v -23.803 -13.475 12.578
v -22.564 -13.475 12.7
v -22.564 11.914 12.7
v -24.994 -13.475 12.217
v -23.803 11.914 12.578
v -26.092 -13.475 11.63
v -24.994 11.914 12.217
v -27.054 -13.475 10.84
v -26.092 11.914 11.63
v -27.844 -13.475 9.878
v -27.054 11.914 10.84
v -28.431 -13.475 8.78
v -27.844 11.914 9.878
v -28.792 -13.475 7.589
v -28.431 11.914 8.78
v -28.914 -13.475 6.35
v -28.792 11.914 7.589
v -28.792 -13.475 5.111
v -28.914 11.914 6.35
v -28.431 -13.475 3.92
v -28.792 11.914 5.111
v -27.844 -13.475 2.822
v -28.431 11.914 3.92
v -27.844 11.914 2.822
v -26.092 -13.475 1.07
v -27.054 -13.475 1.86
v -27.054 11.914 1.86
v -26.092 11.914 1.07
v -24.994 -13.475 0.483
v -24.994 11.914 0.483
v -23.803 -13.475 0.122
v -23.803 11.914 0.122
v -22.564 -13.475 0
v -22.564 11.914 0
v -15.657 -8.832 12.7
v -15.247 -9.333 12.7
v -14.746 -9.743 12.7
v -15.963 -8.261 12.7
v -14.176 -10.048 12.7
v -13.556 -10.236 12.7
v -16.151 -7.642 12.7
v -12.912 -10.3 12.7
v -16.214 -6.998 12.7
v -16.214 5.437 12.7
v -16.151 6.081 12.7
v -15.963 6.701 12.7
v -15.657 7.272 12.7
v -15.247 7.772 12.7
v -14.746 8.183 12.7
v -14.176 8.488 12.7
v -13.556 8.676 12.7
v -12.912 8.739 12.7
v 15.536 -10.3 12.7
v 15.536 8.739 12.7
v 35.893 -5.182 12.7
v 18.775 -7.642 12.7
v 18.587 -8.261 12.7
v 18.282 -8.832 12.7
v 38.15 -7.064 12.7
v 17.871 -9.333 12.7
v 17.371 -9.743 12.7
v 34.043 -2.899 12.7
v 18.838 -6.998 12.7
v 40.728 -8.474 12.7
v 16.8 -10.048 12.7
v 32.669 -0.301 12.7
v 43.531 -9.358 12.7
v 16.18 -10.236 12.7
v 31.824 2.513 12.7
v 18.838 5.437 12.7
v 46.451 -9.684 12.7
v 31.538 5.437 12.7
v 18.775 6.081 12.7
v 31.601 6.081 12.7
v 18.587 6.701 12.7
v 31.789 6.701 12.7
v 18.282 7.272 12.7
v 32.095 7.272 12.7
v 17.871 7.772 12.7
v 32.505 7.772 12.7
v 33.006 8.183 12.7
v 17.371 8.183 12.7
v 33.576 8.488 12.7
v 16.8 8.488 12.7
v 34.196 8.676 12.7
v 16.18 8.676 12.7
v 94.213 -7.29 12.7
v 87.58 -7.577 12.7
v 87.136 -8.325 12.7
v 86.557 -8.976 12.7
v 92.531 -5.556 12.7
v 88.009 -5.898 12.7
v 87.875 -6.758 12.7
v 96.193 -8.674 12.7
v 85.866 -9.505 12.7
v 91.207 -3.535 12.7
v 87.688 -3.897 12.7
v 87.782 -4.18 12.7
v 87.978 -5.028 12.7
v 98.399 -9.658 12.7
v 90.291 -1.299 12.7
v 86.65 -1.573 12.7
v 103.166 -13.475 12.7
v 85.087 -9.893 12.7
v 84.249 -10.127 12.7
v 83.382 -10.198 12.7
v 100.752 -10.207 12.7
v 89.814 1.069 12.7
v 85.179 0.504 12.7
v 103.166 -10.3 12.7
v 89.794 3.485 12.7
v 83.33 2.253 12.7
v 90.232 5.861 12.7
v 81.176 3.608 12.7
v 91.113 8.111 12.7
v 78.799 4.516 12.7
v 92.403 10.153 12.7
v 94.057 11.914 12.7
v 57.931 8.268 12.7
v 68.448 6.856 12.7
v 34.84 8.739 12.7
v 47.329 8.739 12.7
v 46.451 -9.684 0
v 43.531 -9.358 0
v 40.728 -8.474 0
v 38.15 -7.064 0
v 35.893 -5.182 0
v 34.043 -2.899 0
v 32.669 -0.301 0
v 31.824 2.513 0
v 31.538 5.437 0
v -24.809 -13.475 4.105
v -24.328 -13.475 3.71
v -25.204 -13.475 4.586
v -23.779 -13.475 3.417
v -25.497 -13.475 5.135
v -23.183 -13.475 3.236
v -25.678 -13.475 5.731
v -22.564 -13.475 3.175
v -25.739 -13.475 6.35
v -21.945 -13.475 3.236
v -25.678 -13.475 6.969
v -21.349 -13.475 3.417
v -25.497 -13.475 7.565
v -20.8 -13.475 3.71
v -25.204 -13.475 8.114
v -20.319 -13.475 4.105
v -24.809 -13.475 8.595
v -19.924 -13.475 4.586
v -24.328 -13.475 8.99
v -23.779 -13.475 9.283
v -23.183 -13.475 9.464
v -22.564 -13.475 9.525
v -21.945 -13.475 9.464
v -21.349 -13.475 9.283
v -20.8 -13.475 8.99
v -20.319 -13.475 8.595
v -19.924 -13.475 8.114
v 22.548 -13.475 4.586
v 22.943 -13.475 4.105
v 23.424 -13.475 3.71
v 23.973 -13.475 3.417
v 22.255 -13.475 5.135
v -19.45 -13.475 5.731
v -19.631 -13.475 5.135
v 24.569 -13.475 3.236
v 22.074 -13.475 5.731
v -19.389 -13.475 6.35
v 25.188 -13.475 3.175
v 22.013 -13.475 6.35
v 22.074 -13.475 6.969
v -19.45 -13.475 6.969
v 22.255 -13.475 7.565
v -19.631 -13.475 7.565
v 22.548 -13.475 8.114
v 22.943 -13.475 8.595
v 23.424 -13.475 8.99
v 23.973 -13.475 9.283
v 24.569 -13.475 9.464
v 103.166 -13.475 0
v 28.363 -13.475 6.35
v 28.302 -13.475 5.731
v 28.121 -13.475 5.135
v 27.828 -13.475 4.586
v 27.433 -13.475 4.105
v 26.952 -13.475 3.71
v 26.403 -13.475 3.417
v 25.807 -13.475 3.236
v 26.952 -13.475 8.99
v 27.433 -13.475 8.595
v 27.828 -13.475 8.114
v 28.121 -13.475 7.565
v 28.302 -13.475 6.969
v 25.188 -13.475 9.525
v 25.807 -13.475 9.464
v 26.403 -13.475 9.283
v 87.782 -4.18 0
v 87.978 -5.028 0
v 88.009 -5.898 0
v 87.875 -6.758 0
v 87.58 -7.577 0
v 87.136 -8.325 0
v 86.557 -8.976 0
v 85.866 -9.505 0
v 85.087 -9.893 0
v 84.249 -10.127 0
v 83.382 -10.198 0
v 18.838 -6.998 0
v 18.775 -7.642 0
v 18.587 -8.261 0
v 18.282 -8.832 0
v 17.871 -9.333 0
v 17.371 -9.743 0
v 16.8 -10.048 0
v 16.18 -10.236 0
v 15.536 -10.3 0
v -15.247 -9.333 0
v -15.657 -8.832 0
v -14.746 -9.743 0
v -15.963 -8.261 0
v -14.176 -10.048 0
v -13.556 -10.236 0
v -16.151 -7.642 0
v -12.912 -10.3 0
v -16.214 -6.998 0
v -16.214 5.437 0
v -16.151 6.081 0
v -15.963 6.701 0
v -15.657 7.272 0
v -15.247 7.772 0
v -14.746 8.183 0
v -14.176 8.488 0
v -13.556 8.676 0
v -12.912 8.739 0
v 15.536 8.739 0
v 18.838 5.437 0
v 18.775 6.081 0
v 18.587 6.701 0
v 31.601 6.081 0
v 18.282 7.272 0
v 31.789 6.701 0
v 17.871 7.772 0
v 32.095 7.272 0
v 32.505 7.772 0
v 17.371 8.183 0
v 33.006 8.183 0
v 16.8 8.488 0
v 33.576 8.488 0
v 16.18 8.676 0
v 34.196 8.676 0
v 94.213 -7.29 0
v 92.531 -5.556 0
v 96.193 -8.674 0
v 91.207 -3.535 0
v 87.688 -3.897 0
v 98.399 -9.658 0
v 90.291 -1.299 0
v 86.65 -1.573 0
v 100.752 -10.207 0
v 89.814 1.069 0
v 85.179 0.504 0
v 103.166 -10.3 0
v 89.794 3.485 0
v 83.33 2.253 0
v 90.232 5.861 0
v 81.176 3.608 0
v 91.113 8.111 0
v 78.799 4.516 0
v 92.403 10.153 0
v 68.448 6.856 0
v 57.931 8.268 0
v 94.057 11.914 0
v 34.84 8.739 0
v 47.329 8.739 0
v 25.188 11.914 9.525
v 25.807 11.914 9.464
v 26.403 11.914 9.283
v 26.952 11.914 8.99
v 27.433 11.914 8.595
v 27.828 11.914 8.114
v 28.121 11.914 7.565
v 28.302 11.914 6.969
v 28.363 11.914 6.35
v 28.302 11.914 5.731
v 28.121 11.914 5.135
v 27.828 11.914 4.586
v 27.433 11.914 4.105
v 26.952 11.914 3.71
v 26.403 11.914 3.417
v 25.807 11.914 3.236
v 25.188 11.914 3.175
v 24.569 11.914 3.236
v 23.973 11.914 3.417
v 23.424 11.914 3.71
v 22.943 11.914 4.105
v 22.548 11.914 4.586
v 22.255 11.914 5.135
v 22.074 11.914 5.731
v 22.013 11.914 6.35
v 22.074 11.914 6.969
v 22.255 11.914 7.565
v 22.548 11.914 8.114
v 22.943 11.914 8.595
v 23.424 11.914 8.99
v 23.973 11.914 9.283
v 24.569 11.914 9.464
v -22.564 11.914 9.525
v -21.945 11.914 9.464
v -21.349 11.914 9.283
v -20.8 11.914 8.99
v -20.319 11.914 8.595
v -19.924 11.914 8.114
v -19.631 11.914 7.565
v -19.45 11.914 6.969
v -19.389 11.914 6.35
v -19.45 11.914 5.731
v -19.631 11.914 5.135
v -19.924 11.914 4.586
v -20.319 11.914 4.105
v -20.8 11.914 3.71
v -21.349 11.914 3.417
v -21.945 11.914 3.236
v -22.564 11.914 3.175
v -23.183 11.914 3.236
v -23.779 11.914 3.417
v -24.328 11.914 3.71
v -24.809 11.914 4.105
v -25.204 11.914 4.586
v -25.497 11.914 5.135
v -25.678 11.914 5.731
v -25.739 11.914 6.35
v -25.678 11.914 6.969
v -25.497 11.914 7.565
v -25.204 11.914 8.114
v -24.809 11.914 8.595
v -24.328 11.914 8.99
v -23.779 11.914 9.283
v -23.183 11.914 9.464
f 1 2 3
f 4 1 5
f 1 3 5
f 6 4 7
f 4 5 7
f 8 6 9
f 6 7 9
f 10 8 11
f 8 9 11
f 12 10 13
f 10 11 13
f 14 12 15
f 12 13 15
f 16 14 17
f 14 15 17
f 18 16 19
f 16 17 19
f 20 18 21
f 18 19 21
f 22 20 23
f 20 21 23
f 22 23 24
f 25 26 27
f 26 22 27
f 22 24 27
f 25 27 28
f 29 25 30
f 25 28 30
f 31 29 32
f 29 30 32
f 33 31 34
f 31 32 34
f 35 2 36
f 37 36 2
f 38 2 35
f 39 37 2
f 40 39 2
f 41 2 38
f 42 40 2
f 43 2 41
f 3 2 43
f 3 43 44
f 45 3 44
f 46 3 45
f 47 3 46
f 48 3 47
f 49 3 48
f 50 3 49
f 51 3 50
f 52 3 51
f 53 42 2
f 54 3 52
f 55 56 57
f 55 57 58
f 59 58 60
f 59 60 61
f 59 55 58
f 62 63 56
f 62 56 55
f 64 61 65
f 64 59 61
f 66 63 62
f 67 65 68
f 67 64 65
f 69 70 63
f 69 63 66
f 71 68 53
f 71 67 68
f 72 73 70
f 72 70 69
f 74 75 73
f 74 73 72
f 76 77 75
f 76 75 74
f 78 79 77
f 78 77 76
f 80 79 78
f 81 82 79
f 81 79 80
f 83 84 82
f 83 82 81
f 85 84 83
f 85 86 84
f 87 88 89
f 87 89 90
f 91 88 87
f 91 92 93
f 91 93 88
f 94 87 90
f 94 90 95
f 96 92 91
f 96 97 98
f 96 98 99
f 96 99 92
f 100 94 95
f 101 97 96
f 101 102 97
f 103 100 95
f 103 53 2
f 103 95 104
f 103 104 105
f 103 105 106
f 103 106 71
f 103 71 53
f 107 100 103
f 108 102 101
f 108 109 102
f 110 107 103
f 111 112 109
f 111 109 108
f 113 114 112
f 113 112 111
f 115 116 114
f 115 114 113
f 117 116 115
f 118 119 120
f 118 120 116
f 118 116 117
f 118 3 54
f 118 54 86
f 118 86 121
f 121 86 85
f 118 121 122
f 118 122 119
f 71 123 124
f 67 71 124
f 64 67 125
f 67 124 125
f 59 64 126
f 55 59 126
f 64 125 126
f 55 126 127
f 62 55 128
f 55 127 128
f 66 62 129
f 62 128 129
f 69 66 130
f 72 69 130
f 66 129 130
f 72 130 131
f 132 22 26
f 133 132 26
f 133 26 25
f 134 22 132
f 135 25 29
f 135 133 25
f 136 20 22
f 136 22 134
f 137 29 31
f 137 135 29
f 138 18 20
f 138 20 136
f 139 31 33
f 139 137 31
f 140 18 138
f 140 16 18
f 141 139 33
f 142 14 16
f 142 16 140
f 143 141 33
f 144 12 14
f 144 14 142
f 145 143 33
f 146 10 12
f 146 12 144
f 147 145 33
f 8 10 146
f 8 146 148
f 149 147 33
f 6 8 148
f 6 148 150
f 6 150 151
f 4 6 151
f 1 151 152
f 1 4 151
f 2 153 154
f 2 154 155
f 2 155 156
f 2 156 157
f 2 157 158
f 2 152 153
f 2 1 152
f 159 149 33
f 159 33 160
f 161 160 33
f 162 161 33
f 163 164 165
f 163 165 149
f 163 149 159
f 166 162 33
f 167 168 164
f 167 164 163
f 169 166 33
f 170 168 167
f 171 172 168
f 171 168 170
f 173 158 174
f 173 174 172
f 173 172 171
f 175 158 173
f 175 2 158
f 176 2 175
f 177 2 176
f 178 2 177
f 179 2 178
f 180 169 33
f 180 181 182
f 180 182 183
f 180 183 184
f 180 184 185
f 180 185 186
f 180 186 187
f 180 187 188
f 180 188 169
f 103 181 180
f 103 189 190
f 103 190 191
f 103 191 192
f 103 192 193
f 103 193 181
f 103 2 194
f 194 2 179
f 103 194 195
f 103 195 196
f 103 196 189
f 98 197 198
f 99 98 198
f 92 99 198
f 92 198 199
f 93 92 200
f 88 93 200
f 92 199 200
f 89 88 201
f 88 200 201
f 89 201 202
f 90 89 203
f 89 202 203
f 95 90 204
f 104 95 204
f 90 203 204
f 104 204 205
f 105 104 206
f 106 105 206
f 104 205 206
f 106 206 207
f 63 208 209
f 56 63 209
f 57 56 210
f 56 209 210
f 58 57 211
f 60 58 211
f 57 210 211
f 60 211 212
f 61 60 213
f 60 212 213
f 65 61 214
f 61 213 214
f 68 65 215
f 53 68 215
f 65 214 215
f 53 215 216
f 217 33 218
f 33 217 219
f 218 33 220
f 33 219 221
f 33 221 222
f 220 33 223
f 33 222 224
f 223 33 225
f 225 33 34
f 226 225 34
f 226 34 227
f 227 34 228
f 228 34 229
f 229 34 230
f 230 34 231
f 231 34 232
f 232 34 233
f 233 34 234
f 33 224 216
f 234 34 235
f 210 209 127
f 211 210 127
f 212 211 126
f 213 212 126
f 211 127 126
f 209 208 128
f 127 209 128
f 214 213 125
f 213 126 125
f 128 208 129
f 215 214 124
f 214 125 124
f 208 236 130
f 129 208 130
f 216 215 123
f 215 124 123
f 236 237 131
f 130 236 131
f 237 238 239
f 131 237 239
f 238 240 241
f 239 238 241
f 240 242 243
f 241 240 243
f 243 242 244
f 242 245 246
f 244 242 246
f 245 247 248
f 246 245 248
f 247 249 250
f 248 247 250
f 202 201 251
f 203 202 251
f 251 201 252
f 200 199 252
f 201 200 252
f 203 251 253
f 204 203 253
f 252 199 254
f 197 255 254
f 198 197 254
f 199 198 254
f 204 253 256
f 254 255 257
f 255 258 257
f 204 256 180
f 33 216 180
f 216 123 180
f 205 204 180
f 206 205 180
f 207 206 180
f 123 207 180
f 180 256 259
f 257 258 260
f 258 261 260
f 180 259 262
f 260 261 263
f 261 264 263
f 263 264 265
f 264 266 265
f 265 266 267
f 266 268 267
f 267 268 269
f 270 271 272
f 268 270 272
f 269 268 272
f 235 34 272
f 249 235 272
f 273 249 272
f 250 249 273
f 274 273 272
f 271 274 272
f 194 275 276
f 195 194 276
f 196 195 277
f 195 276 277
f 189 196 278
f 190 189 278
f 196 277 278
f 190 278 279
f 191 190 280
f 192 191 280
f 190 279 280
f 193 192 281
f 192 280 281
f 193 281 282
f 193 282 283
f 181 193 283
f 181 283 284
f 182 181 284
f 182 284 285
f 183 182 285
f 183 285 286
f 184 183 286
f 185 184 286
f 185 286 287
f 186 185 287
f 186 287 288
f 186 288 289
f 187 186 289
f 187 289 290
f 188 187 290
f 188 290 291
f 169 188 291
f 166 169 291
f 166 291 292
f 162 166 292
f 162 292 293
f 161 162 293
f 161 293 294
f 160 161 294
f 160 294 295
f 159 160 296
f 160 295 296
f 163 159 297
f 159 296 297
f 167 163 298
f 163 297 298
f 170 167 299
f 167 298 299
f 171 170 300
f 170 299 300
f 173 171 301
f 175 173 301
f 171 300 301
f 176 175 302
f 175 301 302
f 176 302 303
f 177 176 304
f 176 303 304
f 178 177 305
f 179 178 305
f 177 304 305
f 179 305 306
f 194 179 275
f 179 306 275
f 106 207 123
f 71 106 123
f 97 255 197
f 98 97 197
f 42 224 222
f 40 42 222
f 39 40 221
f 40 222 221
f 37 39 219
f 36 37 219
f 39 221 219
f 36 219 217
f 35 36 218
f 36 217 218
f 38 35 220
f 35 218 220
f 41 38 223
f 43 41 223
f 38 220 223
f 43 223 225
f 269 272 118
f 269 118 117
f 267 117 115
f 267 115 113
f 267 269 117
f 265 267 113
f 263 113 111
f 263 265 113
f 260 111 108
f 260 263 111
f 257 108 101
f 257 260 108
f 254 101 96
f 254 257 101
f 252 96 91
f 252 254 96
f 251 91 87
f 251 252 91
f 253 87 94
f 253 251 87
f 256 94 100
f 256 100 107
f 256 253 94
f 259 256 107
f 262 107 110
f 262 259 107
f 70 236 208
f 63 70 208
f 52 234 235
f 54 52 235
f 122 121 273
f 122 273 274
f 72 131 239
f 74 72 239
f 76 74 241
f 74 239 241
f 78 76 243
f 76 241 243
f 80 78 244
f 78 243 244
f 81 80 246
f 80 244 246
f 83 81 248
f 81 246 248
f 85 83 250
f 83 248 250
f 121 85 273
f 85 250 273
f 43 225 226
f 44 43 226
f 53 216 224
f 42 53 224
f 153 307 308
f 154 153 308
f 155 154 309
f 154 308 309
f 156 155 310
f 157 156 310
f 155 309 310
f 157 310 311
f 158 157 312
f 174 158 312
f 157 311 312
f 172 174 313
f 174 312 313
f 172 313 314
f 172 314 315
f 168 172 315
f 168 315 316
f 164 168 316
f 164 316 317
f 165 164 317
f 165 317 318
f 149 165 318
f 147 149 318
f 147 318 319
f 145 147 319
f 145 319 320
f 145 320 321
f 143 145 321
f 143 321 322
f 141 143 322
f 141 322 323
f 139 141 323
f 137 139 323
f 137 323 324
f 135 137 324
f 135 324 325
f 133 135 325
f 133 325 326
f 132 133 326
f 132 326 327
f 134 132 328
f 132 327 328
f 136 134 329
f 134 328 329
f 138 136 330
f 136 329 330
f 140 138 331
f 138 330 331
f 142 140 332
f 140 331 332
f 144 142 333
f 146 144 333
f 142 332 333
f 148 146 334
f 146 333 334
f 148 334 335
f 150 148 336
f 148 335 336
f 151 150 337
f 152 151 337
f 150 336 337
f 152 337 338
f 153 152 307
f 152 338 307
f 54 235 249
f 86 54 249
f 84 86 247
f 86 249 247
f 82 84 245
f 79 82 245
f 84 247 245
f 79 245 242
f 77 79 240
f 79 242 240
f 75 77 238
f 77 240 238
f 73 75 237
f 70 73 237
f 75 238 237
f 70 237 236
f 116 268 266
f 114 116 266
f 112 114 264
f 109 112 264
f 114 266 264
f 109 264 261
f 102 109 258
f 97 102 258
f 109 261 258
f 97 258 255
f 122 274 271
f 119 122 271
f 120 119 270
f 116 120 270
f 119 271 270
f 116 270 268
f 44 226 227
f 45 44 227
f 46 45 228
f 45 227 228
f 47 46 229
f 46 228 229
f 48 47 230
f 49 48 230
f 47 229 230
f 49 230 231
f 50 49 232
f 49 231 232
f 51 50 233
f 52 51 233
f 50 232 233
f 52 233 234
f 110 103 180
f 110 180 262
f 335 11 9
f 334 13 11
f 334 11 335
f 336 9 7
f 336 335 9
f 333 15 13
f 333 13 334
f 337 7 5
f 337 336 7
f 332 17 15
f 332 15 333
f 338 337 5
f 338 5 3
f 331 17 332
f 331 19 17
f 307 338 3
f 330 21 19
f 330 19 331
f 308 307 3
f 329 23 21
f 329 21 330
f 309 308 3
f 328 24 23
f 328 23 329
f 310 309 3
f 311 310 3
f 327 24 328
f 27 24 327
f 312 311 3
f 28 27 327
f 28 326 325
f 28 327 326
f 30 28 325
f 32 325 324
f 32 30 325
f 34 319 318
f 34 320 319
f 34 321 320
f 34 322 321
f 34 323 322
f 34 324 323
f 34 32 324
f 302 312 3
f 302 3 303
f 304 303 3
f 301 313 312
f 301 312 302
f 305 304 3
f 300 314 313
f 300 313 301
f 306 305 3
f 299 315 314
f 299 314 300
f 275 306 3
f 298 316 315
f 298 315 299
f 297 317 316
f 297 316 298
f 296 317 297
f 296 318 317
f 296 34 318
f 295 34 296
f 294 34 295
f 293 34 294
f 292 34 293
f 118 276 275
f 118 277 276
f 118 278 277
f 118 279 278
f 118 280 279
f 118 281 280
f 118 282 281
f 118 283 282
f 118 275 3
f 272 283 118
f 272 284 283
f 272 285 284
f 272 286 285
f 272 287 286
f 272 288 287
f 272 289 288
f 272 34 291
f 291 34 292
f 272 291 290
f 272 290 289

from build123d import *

# Parameters (mm, degrees)
SKETCH1_W           = 133.35
SKETCH1_H           = 38.1
BOSS_EXTRUDE1_DEPTH = 12.7
SKETCH2_R           = 3.175
CUT_EXTRUDE1_DEPTH  = 111.707422131
CAVITY1_DEPTH       = 12.7
CUT_EXTRUDE2_DEPTH  = 108.192417986
CUT_EXTRUDE4_DEPTH  = 108.192417986
CUT_EXTRUDE6_DEPTH  = 108.000606538
CUT_EXTRUDE7_DEPTH  = 105.814568341


# Read off the part's stored shape, not the designer's step: Cavity1
with BuildPart() as part:
    # Sketch1 → Boss-Extrude1 (new body)
    with BuildSketch(Plane.XY):
        with Locations((36.491047297, -7.135705236)):
            Rectangle(SKETCH1_W, SKETCH1_H)
    extrude(amount=BOSS_EXTRUDE1_DEPTH)

    # Sketch2 → Cut-Extrude1 (cut, through all)
    with BuildSketch(Plane(origin=(0, 11.914294764, 0), x_dir=(1, 0, 0), z_dir=(0, 1, 0))):
        with Locations(Location((-22.563952703, -6.35, 0), (0, 0, 270))):
            Circle(SKETCH2_R)
        with Locations(Location((25.188047297, -6.35, 0), (0, 0, 270))):
            Circle(SKETCH2_R)
    extrude(amount=-CUT_EXTRUDE1_DEPTH, mode=Mode.SUBTRACT)

    # Cavity1 outline → Cavity1 (cut)
    with BuildSketch(Plane.XY):
        with BuildLine():
            Line((96.096303093, 11.914294764), (94.056580093, 11.914294764))
            ThreePointArc((94.056580093, 11.914294764), (90.695637122, -2.438784083), (103.166047297, -10.299806924))
            Line((103.166047297, -10.299806924), (103.166047297, -9.052983376))
            ThreePointArc((103.166047297, -9.052983376), (91.591067883, -1.280306677), (96.096303093, 11.914294764))
        make_face()
    extrude(amount=CAVITY1_DEPTH, mode=Mode.SUBTRACT)

    # Sketch4 → Cut-Extrude2 (cut, through all)
    with BuildSketch(Plane(origin=(0, 0, 0), x_dir=(-1, 0, 0), z_dir=(0, 0, -1))):
        Polygon((-103.836015624, 12.337344095), (-103.707966328, -9.632256534), (-101.439664514, -9.485914481), (-98.220139359, -8.863960758), (-94.579880804, -6.924928563), (-91.031086031, -2.168811857), (-90.317668525, 2.879988954), (-91.085877767, 6.8566015), (-93.116460279, 9.831236447), (-96.207936138, 13.398323976), align=None)
    extrude(amount=-CUT_EXTRUDE2_DEPTH, mode=Mode.SUBTRACT)

    # Sketch9 → Cut-Extrude4 (cut, through all)
    with BuildSketch(Plane.XY.offset(12.7)):
        Polygon((-30.183952703, -13.474806924), (119.048045807, -13.474806924), (119.048045807, -32.591302601), (-30.183952703, -32.591302601), (-44.866857433, -32.591302601), (-44.866857433, 12.516766533), (-30.183952703, 12.516766533), align=None)
    extrude(amount=-CUT_EXTRUDE4_DEPTH, mode=Mode.SUBTRACT)

    # Sketch11 → Cut-Extrude6 (cut, through all)
    with BuildSketch(Plane(origin=(0, 11.914294764, 0), x_dir=(1, 0, 0), z_dir=(0, 1, 0))):
        with BuildLine():
            Line((-22.563952703, 0), (-30.183952703, 0))
            Line((-30.183952703, 0), (-30.183952703, -12.7))
            Line((-30.183952703, -12.7), (-22.563952703, -12.7))
            ThreePointArc((-22.563952703, -12.7), (-28.913952703, -6.35), (-22.563952703, 0))
        make_face()
    extrude(amount=-CUT_EXTRUDE6_DEPTH, mode=Mode.SUBTRACT)

    # Sketch12 → Cut-Extrude7 (cut, through all)
    with BuildSketch(Plane.XY):
        with BuildLine():
            Line((34.840047297, 8.739294764), (47.329311848, 8.739294764))
            ThreePointArc((47.329311848, 8.739294764), (63.205042995, 7.678873093), (78.798708551, 4.516448692))
            ThreePointArc((78.798708551, 4.516448692), (84.297585987, 1.423684462), (87.687974389, -3.896852177))
            Line((87.687974389, -3.896852177), (87.782466122, -4.180292862))
            ThreePointArc((87.782466122, -4.180292862), (87.135514906, -8.32519055), (83.381577499, -10.197802807))
            Line((83.381577499, -10.197802807), (46.450888554, -9.684330956))
            ThreePointArc((46.450888554, -9.684330956), (35.893420387, -5.181749435), (31.538047297, 5.437294764))
            ThreePointArc((31.538047297, 5.437294764), (32.505180706, 7.772161355), (34.840047297, 8.739294764))
        make_face()
        with BuildLine():
            Line((18.838047297, 5.437294764), (18.838047297, -6.997806924))
            ThreePointArc((18.838047297, -6.997806924), (17.870913889, -9.332673515), (15.536047297, -10.299806924))
            Line((15.536047297, -10.299806924), (-12.911952703, -10.299806924))
            ThreePointArc((-12.911952703, -10.299806924), (-15.246819294, -9.332673515), (-16.213952703, -6.997806924))
            Line((-16.213952703, -6.997806924), (-16.213952703, 5.437294764))
            ThreePointArc((-16.213952703, 5.437294764), (-15.246819294, 7.772161355), (-12.911952703, 8.739294764))
            Line((-12.911952703, 8.739294764), (15.536047297, 8.739294764))
            ThreePointArc((15.536047297, 8.739294764), (17.870913889, 7.772161355), (18.838047297, 5.437294764))
        make_face()
    extrude(amount=CUT_EXTRUDE7_DEPTH, mode=Mode.SUBTRACT)


solid = part.part
